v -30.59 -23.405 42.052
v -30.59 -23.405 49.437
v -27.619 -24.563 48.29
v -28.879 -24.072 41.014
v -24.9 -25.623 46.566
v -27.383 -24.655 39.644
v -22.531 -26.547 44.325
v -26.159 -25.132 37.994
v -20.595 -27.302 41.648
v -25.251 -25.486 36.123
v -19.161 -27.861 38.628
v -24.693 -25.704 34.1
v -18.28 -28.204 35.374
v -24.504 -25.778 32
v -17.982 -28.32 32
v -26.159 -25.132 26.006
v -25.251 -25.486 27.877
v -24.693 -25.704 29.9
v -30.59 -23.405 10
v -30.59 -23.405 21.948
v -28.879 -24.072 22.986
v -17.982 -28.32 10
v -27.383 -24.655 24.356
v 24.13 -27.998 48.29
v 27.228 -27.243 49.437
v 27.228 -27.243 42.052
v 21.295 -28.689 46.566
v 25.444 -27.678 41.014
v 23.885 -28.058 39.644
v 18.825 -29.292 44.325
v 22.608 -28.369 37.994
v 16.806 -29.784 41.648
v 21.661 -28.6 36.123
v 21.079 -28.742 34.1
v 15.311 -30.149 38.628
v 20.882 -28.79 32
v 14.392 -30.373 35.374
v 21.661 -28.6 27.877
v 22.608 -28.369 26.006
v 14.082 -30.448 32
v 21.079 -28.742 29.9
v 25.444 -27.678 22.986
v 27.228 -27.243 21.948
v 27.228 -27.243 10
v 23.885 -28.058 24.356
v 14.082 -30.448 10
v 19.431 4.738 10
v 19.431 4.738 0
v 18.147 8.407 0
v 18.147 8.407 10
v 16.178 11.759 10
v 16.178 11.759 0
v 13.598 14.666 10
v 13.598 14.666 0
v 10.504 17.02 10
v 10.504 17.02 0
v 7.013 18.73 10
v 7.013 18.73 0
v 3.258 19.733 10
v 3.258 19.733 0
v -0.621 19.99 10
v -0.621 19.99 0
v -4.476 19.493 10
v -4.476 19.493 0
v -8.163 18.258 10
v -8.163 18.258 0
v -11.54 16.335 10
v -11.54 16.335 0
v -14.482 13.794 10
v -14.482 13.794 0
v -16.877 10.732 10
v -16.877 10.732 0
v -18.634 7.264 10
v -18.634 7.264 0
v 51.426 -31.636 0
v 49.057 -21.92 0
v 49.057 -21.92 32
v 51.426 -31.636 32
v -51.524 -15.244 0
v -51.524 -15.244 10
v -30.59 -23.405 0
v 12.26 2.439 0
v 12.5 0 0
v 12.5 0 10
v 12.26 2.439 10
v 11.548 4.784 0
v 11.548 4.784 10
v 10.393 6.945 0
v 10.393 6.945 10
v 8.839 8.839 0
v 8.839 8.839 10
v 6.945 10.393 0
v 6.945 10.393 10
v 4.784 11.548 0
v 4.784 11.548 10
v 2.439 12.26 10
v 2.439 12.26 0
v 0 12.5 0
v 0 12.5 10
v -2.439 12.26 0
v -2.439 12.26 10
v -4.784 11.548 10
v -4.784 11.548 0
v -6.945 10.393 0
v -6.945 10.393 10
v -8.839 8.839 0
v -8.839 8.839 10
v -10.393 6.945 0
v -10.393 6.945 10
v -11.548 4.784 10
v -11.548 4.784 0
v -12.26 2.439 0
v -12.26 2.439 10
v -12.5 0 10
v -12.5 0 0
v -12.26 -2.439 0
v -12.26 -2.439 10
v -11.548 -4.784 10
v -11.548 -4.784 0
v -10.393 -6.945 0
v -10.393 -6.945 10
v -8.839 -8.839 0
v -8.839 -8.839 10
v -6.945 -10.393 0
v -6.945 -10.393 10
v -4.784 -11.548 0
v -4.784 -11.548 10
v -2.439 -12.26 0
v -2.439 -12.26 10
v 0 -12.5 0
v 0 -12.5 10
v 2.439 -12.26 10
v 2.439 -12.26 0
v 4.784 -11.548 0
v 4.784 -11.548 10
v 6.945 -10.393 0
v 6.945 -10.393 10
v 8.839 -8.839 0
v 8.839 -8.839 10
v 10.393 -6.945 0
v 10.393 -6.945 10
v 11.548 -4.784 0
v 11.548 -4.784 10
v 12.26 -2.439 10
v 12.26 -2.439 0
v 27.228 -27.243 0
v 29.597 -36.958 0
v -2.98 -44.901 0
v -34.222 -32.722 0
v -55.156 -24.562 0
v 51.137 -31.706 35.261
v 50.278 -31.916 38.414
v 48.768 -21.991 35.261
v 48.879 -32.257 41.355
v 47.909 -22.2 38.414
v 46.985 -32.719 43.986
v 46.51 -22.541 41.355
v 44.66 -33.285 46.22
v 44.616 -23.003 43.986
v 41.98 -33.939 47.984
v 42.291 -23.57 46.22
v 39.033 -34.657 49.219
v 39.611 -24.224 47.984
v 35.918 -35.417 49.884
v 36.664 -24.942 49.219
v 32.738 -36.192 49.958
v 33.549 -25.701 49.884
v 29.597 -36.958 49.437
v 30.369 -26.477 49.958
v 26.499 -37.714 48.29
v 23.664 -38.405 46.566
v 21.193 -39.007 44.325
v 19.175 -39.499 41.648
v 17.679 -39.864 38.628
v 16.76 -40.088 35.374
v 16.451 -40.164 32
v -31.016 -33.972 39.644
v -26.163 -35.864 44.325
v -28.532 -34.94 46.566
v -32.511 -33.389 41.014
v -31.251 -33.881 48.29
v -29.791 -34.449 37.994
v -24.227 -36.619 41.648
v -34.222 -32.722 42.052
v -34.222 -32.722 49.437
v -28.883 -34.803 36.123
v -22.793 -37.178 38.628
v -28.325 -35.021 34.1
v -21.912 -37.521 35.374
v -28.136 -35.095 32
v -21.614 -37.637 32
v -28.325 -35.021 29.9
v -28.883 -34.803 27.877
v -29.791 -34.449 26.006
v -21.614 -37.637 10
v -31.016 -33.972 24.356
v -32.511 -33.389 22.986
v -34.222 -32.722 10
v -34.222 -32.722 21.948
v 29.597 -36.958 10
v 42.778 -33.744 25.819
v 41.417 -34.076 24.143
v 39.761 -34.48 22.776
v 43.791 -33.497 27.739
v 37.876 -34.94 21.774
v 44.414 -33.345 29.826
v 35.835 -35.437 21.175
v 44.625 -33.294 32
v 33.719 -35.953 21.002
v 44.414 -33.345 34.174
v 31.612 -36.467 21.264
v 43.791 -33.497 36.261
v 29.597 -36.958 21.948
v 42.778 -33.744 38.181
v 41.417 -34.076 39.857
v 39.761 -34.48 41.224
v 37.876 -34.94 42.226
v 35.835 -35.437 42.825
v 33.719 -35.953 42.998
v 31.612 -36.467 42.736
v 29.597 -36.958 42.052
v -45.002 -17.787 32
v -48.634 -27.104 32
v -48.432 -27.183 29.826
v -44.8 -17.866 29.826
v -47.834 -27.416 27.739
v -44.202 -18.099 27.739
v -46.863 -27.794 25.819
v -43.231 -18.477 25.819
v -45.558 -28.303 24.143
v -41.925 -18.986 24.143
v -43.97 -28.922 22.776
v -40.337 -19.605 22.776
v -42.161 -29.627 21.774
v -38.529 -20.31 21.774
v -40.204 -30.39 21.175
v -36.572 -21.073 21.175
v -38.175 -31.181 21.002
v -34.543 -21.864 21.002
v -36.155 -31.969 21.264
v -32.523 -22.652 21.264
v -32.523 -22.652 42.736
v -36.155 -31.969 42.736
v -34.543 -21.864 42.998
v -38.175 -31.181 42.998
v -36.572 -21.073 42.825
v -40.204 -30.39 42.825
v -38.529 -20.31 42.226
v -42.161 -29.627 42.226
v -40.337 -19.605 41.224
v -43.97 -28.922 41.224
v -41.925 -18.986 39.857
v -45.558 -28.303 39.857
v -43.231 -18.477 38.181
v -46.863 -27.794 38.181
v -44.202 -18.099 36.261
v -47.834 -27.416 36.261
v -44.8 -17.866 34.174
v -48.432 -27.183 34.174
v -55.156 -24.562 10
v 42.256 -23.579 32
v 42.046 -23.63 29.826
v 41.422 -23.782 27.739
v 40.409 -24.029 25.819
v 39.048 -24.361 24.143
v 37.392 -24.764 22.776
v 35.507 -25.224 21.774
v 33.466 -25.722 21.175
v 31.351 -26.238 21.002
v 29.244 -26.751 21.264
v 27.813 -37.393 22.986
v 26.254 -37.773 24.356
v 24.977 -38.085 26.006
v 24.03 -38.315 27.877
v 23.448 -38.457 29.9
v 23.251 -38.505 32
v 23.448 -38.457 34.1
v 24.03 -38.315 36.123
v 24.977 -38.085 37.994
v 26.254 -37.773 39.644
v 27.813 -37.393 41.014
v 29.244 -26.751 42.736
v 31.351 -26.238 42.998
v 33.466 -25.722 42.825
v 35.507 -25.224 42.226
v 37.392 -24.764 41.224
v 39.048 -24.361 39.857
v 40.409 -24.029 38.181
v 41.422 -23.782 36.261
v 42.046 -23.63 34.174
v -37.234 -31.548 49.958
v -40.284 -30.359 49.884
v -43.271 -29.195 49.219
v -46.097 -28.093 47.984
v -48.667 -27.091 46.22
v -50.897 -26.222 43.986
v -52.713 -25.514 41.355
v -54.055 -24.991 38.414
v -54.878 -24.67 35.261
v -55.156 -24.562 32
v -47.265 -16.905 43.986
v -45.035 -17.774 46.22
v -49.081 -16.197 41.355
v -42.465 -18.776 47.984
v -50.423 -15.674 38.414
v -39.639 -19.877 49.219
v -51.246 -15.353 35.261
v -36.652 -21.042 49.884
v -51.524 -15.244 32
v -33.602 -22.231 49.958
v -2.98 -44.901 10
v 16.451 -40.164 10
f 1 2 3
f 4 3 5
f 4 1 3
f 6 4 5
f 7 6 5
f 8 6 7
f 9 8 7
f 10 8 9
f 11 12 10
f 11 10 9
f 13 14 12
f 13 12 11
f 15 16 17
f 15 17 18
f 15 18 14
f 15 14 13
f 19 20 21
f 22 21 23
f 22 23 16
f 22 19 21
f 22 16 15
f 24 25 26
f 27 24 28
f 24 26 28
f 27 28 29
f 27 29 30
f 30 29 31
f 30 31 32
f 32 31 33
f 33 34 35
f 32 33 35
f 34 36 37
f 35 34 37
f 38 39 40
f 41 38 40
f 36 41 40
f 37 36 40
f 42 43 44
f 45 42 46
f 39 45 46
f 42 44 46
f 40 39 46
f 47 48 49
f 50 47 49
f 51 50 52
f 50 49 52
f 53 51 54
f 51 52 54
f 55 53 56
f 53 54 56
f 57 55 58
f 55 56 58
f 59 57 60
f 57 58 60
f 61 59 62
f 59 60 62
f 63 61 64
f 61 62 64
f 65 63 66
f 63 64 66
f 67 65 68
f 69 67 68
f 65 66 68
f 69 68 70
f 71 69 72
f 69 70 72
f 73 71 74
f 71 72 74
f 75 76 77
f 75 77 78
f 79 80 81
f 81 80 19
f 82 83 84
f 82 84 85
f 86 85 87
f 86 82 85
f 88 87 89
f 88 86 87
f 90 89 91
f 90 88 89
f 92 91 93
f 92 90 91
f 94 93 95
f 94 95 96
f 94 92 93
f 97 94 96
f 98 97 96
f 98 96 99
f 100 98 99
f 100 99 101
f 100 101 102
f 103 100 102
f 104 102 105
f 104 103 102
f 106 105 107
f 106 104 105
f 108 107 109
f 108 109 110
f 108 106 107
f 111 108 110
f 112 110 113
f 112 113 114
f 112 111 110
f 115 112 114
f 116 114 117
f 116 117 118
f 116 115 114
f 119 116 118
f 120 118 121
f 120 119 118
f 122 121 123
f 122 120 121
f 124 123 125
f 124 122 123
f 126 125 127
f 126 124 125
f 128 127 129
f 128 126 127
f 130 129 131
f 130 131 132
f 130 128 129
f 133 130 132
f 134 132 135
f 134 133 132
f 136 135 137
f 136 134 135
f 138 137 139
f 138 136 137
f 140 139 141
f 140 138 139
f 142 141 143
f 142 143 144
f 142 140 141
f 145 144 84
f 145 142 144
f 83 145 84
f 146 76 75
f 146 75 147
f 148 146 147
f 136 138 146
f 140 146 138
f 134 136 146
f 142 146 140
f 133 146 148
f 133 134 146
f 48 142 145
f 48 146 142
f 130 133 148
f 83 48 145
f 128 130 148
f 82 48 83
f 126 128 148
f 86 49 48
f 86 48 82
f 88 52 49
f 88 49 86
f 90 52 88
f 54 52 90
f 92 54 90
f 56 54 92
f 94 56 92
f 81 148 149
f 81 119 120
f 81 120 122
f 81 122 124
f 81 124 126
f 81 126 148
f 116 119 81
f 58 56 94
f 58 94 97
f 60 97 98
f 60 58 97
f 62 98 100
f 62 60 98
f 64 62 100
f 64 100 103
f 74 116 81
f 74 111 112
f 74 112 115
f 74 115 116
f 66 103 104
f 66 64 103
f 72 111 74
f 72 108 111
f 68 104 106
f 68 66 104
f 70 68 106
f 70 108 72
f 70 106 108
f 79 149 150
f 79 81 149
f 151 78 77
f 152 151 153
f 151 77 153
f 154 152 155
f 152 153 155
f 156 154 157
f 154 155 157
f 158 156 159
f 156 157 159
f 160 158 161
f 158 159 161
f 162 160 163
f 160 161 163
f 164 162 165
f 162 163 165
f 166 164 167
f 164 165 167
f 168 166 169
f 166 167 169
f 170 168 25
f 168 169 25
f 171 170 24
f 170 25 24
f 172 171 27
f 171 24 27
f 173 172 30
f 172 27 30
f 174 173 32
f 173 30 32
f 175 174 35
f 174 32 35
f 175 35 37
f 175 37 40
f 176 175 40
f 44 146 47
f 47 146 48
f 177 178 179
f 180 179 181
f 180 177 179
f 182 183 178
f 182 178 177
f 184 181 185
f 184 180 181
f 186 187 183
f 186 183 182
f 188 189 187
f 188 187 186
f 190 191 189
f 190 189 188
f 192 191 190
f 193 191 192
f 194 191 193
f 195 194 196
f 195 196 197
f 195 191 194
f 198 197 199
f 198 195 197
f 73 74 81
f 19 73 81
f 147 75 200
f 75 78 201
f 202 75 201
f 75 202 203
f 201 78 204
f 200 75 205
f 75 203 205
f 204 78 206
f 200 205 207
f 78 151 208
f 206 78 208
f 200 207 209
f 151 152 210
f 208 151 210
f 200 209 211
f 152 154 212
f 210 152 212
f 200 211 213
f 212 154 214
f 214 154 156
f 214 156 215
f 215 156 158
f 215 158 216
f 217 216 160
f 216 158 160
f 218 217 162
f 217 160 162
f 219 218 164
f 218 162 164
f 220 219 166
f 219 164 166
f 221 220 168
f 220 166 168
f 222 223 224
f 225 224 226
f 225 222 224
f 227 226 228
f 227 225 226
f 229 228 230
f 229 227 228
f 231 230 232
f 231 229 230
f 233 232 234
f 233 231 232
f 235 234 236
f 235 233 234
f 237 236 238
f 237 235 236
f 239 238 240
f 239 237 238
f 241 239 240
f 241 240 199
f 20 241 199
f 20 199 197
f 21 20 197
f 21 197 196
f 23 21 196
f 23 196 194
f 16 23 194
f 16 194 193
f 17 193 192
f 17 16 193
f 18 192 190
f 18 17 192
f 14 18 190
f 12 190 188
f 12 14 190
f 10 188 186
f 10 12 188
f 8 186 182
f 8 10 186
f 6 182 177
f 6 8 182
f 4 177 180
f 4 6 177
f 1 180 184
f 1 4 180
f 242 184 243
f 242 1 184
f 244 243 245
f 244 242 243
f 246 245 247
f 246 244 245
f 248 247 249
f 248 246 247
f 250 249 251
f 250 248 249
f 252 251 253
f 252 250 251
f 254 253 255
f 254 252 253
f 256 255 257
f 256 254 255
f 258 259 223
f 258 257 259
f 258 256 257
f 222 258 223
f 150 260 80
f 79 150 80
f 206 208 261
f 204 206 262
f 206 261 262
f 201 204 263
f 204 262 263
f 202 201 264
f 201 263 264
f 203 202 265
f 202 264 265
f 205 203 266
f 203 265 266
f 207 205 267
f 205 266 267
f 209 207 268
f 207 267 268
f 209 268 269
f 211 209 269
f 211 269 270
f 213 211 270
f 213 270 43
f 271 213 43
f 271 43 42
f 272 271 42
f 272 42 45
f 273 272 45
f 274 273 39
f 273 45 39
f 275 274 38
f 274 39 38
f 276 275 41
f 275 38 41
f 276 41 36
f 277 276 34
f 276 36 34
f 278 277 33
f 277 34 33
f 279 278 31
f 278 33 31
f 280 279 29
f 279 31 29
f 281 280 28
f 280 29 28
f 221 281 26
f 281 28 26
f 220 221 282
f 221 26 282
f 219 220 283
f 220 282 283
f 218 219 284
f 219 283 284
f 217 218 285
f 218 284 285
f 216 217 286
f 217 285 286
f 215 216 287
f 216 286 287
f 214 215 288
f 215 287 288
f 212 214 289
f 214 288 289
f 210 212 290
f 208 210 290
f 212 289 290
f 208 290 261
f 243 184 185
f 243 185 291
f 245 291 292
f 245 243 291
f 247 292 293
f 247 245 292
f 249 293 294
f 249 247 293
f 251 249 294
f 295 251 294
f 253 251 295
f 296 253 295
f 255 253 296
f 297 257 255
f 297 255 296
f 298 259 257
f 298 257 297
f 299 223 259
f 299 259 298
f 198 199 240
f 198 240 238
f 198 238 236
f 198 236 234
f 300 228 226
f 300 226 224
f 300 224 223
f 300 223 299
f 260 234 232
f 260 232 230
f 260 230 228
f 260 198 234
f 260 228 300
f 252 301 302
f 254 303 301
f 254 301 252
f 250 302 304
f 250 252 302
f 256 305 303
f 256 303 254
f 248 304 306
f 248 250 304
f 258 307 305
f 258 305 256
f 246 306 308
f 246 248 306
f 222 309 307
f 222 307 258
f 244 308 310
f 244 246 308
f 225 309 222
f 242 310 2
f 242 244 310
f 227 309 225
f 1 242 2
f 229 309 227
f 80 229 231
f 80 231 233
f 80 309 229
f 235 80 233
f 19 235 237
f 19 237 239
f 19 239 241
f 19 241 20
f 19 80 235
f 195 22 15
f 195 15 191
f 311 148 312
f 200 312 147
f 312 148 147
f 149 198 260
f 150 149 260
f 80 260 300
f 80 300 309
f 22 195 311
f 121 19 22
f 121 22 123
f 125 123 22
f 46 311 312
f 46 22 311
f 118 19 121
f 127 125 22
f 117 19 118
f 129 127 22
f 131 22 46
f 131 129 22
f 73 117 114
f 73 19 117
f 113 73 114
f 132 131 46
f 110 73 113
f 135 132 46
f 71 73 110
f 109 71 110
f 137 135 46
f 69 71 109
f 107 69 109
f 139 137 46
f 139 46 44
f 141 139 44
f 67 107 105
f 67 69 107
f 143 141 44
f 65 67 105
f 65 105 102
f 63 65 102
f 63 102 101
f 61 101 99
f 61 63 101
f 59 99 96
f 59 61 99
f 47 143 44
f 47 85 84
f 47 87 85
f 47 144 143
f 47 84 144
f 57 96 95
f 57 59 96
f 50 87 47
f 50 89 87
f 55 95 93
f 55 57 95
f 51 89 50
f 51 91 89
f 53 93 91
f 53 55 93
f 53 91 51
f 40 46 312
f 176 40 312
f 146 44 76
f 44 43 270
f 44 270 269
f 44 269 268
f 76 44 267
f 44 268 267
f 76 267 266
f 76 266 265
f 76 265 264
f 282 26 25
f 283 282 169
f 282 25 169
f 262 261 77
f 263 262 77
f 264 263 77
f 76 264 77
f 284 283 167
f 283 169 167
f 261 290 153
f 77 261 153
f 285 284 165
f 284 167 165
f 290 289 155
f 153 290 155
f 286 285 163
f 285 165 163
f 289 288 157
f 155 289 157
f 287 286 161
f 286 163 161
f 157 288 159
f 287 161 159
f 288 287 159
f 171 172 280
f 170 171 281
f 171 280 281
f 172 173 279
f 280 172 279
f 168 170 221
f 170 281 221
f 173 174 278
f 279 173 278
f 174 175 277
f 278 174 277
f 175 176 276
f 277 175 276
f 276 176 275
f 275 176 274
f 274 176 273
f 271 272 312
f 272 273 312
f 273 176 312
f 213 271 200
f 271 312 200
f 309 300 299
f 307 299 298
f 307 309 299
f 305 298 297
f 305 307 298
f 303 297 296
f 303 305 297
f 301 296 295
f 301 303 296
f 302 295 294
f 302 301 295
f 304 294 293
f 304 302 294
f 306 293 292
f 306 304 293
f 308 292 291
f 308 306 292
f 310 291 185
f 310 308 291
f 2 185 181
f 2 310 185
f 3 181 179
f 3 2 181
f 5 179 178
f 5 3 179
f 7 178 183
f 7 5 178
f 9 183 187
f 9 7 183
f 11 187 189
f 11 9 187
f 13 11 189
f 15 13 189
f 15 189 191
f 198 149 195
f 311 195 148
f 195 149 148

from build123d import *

# Parameters (mm, degrees)
SKETCH1_R           = 12.5
BOSS_EXTRUDE1_DEPTH = 10
BOSS_EXTRUDE2_DEPTH = 64
SKETCH3_R           = 11
CUT_EXTRUDE1_DEPTH  = 64
BOSS_EXTRUDE3_DEPTH = 10
BOSS_EXTRUDE4_DEPTH = 10


with BuildPart() as part:
    # Sketch1 → Boss-Extrude1 (new body)
    with BuildSketch(Plane.XY):
        with BuildLine():
            Line((-18.634160035, 7.264164081), (-34.222061974, -32.722193067))
            Line((-34.222061974, -32.722193067), (-2.980251959, -44.901203751))
            Line((-2.980251959, -44.901203751), (29.597134129, -36.958099196))
            Line((29.597134129, -36.958099196), (19.430763633, 4.73766025))
            ThreePointArc((19.430763633, 4.73766025), (1.324556426, 19.956090556), (-18.634160035, 7.264164081))
        make_face()
        Circle(SKETCH1_R, mode=Mode.SUBTRACT)
    extrude(amount=BOSS_EXTRUDE1_DEPTH)

    # Sketch2 → Boss-Extrude2 (add)
    with BuildSketch(Plane.XY.offset(10)):
        Polygon((27.228304004, -27.24271738), (29.597134129, -36.958099196), (51.425886213, -31.635755051), (49.057056089, -21.920373235), align=None)
        Polygon((16.450511674, -40.163543501), (29.597134129, -36.958099196), (27.228304004, -27.24271738), (14.081681549, -30.448161684), align=None)
    boss_extrude2 = extrude(amount=BOSS_EXTRUDE2_DEPTH)

    # Sketch3 → Cut-Extrude1 (cut)
    with BuildSketch(Plane(origin=(7.797540371, -31.98037763, 0), x_dir=(0.971538182, 0.236883012, 0), z_dir=(-0.236883012, 0.971538182, 0))):
        with Locations((24.468239022, -32)):
            Circle(SKETCH3_R)
        with BuildLine():
            ThreePointArc((42.468239022, -32), (24.468239022, -50), (6.468239022, -32))
            Line((6.468239022, -32), (6.468239022, -74))
            Line((6.468239022, -74), (42.468239022, -74))
            Line((42.468239022, -74), (42.468239022, -32))
        make_face()
    cut_extrude1 = extrude(amount=-CUT_EXTRUDE1_DEPTH, mode=Mode.SUBTRACT)

    # Mirror1: Boss-Extrude2, Cut-Extrude1 across plane
    add(boss_extrude2.mirror(Plane(origin=(0, 0, 0), x_dir=(0, 0, 1), z_dir=(-0.997804528, 0.066227821, 0))))
    add(cut_extrude1.mirror(Plane(origin=(0, 0, 0), x_dir=(0, 0, 1), z_dir=(-0.997804528, 0.066227821, 0))), mode=Mode.SUBTRACT)

    # Sketch5 → Boss-Extrude3 (add)
    with BuildSketch(Plane(origin=(0, 0, 10), x_dir=(-1, 0, 0), z_dir=(0, 0, -1))):
        Polygon((-49.057056089, -21.920373235), (-51.425886213, -31.635755051), (-29.597134129, -36.958099196), (-27.228304004, -27.24271738), align=None)
    extrude(amount=BOSS_EXTRUDE3_DEPTH)

    # Sketch6 → Boss-Extrude4 (add)
    with BuildSketch(Plane(origin=(0, 0, 10), x_dir=(-1, 0, 0), z_dir=(0, 0, -1))):
        Polygon((30.589979933, -23.405113049), (34.222061974, -32.722193067), (55.155900056, -24.561544323), (51.523818015, -15.244464306), align=None)
    extrude(amount=BOSS_EXTRUDE4_DEPTH)


solid = part.part
